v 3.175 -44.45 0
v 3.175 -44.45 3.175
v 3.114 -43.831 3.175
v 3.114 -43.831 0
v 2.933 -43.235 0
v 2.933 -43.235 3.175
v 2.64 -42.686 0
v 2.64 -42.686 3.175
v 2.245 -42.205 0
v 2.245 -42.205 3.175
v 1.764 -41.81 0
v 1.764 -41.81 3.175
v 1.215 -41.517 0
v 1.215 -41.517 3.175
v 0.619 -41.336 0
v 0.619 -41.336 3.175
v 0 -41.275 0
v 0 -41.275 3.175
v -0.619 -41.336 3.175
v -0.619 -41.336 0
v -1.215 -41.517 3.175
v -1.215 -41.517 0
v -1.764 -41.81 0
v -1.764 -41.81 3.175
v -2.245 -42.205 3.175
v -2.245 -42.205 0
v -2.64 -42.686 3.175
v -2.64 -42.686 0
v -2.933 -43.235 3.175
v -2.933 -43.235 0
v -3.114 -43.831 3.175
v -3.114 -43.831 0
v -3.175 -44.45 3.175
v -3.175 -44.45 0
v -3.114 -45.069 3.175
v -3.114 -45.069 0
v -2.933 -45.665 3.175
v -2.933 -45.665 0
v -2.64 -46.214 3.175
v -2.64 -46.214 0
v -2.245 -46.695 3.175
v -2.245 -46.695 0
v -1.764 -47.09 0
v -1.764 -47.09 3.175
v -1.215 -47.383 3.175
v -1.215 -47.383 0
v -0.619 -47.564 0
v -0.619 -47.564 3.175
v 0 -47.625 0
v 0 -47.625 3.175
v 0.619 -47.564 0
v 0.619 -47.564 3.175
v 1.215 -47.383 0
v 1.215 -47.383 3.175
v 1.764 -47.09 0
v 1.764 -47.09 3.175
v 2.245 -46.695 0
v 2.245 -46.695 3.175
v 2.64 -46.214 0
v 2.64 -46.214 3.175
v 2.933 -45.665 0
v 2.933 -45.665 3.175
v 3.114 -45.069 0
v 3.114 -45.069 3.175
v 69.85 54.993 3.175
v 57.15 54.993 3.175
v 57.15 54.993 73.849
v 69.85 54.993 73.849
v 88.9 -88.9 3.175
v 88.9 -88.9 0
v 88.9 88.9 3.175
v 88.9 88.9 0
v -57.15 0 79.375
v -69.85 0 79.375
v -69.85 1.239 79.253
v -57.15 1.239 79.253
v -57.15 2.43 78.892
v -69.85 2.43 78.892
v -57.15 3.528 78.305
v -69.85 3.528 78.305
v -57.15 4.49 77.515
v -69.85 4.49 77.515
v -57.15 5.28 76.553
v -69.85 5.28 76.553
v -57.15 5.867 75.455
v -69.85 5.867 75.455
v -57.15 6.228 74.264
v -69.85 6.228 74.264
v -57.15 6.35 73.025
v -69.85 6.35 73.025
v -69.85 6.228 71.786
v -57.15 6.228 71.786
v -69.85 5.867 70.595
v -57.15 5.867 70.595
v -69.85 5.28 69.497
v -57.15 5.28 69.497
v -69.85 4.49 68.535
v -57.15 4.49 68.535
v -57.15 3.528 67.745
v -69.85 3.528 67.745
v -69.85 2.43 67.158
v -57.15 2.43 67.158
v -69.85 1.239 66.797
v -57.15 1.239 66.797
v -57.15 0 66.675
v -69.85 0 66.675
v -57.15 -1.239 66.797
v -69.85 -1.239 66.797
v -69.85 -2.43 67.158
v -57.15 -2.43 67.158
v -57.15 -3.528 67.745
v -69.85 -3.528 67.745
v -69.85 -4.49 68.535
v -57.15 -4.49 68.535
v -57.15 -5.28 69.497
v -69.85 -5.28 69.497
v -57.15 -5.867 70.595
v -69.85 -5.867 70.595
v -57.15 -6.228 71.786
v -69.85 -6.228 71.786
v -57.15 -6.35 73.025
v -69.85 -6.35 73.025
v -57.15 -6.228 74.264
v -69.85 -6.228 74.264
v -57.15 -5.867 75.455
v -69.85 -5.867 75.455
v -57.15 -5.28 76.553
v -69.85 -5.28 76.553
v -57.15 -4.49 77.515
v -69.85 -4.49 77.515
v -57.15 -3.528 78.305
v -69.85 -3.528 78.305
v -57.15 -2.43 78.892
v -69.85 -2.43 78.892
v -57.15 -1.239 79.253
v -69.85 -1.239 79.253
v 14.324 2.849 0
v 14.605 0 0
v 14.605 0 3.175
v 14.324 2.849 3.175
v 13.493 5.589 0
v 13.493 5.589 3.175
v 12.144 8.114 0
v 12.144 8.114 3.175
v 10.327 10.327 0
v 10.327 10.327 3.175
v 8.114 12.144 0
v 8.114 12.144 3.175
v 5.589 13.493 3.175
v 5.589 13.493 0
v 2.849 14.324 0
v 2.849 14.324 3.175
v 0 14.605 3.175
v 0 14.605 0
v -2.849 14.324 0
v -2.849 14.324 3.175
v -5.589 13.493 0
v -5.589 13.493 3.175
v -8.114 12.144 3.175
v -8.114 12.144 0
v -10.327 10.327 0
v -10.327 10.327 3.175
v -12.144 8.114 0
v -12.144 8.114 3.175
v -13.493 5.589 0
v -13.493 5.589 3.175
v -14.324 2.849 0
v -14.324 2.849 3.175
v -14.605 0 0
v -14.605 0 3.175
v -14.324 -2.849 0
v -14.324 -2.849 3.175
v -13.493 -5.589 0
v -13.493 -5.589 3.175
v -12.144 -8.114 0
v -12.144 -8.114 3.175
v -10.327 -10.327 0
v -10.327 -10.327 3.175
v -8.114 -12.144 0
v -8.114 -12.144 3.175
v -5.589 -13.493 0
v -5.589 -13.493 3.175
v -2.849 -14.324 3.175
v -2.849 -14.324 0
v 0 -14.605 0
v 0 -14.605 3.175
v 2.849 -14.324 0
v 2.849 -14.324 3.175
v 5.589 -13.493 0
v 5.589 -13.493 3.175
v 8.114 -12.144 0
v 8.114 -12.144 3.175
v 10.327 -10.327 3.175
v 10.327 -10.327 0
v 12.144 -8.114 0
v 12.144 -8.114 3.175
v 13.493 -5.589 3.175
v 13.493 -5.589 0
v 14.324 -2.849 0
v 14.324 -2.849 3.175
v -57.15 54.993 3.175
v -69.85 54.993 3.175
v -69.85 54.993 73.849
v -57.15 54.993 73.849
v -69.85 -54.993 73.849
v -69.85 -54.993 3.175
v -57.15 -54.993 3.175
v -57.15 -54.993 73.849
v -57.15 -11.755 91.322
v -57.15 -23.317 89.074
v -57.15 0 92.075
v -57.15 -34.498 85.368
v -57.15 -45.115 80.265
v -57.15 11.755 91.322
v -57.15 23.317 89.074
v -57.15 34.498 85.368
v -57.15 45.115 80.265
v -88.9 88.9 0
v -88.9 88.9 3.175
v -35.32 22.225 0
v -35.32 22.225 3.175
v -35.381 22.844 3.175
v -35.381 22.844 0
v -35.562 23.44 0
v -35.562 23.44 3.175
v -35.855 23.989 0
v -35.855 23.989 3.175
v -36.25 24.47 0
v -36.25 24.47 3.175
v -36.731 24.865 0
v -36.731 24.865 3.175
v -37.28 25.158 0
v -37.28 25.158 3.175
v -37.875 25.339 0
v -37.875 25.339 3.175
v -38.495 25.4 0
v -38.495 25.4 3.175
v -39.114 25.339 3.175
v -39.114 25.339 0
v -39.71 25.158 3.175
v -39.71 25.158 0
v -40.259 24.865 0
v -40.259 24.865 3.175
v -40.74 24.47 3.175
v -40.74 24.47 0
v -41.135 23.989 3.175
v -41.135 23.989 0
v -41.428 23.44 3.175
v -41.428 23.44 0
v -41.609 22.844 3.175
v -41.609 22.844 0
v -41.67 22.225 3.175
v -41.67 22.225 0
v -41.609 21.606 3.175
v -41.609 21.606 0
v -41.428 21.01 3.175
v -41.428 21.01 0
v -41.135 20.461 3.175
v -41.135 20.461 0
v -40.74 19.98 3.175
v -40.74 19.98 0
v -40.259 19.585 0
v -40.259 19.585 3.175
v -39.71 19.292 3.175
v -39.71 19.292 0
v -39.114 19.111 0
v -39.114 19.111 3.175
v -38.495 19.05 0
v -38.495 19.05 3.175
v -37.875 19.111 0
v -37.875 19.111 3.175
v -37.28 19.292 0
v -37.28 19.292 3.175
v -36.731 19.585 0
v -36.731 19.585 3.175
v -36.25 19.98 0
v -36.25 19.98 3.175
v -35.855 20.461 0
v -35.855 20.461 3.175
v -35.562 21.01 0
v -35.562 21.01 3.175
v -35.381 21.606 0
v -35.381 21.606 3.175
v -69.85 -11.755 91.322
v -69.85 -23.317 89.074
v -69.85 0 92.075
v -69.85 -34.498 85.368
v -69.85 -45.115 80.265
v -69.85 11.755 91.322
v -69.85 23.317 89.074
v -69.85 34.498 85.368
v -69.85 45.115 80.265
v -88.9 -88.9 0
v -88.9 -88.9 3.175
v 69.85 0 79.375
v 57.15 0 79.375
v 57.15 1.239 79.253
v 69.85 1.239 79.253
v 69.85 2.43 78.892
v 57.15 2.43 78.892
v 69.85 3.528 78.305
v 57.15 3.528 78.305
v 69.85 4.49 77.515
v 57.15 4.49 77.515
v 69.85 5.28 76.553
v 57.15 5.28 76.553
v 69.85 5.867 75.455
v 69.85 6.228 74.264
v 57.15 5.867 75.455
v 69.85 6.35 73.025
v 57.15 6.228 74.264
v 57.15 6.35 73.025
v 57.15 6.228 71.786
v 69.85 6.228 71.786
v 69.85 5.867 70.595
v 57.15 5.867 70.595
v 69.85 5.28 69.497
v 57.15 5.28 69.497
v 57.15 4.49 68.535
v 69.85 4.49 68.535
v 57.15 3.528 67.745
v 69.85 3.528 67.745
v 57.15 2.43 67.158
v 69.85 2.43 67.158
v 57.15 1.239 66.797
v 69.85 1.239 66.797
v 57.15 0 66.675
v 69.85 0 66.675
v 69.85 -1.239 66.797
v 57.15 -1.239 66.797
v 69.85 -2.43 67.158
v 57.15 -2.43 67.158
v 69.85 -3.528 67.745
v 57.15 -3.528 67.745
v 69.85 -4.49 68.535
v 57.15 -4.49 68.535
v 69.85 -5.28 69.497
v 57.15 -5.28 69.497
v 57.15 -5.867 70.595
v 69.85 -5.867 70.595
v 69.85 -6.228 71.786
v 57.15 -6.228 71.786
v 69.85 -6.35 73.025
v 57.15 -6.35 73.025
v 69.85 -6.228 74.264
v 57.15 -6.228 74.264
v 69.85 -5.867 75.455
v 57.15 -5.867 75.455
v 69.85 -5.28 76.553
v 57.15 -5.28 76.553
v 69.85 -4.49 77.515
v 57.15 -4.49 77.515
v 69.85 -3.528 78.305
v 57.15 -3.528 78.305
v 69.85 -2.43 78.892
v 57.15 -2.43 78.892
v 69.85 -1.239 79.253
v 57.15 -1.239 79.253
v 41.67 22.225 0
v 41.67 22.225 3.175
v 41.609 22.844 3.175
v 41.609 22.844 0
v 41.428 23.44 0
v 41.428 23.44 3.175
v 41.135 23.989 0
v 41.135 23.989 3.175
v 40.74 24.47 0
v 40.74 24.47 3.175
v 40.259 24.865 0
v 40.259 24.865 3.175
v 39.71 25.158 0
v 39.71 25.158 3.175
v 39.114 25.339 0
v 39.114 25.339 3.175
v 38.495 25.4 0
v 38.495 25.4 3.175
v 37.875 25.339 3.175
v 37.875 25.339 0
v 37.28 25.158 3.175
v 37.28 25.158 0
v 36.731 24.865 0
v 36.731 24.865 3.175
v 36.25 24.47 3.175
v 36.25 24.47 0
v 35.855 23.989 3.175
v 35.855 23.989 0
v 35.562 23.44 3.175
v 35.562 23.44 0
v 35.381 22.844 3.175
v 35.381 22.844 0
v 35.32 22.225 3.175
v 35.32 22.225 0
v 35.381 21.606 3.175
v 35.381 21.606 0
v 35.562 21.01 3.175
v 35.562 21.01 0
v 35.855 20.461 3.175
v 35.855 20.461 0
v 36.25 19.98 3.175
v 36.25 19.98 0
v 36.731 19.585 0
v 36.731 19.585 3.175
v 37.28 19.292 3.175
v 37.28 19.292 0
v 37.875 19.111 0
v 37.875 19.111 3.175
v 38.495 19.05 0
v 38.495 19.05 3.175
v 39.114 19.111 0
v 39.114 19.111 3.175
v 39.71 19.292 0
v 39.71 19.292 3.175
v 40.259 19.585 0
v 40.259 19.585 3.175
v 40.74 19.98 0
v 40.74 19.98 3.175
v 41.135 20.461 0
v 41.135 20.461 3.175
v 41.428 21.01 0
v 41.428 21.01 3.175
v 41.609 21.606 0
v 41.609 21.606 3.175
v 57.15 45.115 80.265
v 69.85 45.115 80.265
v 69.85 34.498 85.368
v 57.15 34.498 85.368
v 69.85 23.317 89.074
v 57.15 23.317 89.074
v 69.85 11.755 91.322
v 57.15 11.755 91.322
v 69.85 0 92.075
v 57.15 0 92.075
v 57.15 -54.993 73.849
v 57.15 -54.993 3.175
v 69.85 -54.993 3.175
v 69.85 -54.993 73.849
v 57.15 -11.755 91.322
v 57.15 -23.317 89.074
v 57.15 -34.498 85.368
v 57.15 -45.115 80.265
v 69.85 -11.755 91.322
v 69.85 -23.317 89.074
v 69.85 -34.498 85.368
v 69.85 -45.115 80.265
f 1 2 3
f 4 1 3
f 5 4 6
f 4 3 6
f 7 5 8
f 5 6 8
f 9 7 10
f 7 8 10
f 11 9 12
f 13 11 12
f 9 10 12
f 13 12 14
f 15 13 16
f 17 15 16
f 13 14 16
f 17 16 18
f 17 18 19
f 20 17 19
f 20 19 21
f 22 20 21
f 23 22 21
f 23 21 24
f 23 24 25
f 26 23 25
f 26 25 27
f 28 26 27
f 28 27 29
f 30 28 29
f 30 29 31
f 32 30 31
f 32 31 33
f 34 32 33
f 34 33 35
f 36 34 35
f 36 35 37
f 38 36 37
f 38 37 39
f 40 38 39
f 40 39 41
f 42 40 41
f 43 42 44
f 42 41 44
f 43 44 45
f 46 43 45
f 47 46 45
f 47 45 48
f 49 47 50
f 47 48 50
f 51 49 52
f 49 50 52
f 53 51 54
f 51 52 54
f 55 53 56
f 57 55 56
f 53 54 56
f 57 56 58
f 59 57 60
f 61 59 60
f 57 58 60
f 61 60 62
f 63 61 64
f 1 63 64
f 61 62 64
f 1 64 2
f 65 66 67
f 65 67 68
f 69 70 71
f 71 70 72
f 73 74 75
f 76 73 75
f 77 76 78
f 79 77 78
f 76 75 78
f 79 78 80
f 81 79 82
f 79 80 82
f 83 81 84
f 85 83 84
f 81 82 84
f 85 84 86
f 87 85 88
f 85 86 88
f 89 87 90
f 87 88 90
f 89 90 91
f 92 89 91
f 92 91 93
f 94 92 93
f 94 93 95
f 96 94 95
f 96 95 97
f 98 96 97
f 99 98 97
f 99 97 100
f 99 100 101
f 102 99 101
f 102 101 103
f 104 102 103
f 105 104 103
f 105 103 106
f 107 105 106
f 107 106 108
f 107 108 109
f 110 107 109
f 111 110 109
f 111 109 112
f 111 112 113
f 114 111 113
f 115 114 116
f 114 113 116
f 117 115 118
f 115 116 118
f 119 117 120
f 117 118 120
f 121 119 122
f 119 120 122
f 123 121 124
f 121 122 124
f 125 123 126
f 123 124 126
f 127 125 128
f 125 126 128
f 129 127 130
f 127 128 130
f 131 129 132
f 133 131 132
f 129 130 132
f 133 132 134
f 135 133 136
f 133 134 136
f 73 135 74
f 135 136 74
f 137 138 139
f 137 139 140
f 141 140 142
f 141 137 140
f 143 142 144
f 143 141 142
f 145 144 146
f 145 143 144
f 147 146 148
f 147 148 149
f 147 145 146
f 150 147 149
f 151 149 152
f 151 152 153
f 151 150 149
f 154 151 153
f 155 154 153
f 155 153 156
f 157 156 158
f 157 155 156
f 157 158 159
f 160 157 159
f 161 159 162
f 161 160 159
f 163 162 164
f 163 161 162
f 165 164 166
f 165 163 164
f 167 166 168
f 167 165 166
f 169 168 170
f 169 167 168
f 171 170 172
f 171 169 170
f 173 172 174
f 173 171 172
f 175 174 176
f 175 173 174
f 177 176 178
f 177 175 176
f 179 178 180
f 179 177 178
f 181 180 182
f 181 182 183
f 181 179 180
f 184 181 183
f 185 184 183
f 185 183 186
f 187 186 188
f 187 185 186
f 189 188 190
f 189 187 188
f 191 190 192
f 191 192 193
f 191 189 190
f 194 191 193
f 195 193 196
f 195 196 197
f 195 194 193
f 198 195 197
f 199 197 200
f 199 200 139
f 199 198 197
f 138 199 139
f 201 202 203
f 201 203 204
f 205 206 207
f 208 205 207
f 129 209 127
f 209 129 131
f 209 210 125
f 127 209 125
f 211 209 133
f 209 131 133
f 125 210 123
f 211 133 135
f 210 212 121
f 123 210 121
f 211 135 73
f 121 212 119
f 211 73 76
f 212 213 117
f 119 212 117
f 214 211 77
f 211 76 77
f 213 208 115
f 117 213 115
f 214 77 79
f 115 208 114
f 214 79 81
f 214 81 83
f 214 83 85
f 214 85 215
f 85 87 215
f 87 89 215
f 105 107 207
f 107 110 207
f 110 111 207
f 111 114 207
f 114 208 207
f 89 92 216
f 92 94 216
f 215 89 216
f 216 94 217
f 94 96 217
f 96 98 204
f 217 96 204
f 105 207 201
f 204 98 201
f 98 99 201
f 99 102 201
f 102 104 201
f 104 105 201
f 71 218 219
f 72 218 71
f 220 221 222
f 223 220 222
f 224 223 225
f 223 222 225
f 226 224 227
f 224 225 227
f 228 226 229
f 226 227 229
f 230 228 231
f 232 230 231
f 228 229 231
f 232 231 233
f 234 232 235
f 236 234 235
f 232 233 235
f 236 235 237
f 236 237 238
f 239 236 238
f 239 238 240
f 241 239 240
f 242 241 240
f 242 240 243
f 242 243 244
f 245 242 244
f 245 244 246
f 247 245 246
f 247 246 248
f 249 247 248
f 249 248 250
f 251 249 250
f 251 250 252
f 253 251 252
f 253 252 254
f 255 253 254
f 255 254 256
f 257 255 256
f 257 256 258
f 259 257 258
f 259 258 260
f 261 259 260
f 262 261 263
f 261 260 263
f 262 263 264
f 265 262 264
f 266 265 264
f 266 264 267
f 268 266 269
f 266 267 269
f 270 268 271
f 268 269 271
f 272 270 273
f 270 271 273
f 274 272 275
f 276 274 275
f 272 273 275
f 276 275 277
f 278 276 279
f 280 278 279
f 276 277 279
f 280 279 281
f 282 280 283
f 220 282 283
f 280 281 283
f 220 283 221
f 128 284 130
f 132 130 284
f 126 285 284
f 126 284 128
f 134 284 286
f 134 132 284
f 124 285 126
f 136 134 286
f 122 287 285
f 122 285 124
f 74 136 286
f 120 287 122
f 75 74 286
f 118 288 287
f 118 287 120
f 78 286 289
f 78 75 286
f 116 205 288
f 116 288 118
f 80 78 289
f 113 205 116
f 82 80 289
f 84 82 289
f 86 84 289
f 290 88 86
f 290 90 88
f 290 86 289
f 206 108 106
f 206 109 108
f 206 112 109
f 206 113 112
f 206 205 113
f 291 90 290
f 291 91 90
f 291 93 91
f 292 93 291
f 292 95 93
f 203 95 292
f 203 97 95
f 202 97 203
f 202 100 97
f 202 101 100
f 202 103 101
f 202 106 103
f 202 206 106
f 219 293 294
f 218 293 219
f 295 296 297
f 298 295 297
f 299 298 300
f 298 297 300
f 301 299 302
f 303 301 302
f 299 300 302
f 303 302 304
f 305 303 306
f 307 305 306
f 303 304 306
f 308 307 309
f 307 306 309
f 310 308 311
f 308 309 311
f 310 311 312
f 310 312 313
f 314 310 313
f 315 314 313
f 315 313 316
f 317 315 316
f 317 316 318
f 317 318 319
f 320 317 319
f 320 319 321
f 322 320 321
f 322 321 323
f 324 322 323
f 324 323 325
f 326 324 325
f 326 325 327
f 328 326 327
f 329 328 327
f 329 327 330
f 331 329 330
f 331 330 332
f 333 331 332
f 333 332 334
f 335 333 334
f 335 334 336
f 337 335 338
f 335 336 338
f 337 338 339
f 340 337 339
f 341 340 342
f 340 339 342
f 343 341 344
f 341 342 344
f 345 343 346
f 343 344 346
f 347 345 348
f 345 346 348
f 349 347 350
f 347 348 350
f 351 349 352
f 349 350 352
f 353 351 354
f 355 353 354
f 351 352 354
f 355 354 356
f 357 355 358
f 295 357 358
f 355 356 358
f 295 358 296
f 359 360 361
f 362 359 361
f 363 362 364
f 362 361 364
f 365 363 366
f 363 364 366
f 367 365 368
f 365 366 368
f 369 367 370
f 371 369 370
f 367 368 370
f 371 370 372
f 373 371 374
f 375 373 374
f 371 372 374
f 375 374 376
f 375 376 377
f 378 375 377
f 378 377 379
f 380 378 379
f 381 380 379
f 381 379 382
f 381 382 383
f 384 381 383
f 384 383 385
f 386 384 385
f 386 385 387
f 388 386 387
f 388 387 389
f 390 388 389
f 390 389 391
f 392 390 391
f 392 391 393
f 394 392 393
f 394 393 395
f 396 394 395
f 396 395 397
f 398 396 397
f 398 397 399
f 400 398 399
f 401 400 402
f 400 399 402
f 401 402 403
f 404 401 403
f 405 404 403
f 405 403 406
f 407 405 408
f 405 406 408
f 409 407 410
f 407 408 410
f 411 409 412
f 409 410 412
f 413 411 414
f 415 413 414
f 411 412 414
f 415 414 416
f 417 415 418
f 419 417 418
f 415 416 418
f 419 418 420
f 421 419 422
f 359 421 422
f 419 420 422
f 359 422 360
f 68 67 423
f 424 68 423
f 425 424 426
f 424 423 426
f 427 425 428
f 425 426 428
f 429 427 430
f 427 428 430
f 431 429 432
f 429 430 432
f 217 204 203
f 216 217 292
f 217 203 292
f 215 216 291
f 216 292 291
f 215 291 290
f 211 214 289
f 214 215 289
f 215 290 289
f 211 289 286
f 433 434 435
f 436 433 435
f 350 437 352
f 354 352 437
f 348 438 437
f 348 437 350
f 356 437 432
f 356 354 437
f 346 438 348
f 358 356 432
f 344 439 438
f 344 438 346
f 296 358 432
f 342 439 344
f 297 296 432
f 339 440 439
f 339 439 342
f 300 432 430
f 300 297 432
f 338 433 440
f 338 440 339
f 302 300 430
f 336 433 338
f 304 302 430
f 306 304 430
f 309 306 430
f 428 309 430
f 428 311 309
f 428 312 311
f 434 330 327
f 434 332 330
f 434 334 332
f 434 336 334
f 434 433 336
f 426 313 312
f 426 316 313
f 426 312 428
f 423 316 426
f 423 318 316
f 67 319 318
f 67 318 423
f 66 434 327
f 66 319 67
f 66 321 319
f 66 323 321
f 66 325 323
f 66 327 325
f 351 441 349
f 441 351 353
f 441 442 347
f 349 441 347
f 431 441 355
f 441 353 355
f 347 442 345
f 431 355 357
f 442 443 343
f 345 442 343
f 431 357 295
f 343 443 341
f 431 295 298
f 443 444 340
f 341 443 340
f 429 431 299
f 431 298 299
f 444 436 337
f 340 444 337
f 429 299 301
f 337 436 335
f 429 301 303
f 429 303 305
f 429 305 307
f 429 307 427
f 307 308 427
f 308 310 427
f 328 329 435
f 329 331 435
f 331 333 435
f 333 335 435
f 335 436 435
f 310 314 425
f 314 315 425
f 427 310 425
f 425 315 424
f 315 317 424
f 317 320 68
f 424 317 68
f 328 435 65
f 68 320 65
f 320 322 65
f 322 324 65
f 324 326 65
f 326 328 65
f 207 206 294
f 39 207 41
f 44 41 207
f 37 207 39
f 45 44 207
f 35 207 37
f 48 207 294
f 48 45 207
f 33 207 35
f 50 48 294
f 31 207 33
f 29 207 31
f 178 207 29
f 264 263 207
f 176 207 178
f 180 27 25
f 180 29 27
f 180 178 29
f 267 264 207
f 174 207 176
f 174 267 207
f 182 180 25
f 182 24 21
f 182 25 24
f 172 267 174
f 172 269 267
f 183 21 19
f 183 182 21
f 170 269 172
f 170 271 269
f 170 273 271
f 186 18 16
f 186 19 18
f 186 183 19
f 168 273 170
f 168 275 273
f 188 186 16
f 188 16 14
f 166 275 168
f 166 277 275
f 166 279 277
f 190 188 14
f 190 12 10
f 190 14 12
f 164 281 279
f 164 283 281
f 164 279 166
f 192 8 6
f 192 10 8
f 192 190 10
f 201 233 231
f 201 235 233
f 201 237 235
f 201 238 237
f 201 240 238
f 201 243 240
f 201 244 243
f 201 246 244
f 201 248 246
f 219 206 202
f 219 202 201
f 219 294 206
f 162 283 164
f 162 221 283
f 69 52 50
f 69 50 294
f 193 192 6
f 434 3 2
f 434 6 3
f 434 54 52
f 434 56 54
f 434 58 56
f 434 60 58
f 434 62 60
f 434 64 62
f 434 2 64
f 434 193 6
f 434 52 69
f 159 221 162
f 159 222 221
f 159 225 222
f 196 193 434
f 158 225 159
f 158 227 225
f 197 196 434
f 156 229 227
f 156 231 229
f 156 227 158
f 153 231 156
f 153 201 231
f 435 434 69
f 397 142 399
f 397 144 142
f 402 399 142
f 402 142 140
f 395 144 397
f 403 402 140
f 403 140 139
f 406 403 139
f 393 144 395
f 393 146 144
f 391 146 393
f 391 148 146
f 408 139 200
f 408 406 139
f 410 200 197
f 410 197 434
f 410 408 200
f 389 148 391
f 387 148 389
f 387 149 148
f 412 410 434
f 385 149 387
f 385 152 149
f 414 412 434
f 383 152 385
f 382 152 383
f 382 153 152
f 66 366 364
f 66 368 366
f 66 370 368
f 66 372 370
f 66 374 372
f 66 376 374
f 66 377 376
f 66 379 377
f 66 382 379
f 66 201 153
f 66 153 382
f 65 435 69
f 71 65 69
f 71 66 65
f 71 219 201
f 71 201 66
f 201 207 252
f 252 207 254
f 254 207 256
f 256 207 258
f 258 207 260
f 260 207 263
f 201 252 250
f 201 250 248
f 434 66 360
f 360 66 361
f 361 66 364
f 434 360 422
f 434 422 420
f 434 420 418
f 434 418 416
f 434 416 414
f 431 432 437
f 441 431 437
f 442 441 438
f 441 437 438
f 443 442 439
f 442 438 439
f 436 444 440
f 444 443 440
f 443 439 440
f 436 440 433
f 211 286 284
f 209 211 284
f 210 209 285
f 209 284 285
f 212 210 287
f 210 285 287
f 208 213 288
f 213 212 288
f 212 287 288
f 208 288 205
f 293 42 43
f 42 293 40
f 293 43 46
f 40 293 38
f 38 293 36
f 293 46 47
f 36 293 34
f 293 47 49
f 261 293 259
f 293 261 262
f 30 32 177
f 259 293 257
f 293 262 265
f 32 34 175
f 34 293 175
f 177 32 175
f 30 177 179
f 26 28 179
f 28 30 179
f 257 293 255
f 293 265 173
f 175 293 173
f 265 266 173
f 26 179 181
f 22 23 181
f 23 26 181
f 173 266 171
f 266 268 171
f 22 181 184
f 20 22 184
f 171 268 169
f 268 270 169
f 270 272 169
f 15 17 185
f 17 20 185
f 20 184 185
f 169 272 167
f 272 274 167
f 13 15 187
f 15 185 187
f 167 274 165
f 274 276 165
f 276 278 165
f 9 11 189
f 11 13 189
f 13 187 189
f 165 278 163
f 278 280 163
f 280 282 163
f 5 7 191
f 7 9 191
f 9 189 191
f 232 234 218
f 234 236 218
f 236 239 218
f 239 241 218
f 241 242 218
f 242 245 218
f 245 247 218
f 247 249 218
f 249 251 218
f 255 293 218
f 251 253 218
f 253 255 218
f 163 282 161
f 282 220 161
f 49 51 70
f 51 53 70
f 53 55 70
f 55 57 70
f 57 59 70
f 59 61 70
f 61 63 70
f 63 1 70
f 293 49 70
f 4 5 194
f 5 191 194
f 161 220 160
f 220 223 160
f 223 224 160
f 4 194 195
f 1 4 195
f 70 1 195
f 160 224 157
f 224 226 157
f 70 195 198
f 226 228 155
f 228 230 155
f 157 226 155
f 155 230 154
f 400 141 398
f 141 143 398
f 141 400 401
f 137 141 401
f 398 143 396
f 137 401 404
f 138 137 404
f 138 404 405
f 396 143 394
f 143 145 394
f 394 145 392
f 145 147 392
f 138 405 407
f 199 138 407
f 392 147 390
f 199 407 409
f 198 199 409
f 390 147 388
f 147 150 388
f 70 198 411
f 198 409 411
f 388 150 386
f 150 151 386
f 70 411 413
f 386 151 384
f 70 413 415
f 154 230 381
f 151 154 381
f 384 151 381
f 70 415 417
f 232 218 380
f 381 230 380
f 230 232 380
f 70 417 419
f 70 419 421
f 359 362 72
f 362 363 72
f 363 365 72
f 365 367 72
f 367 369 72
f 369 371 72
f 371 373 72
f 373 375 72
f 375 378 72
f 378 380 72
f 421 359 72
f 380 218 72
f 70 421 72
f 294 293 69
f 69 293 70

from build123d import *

# Parameters (mm, degrees)
SKETCH1_W           = 177.8
SKETCH1_H           = 177.8
SKETCH1_R           = 14.605
BOSS_EXTRUDE1_DEPTH = 3.175
SKETCH2_R           = 3.175
CUT_EXTRUDE1_DEPTH  = 126.763669734
SKETCH2_3_W         = 12.7
SKETCH2_3_H         = 109.98522628
BOSS_EXTRUDE2_DEPTH = 88.9
SKETCH3_R           = 6.35
CUT_EXTRUDE2_DEPTH  = 204.918067186


with BuildPart() as part:
    # Sketch1 → Boss-Extrude1 (new body)
    with BuildSketch(Plane.XY):
        Rectangle(SKETCH1_W, SKETCH1_H)
        Circle(SKETCH1_R, mode=Mode.SUBTRACT)
    extrude(amount=BOSS_EXTRUDE1_DEPTH)

    # Sketch2 → Cut-Extrude1 (cut, through all)
    with BuildSketch(Plane.XY.offset(3.175)):
        with Locations((-38.494829198, 22.225)):
            Circle(SKETCH2_R)
        with Locations((0, -44.45)):
            Circle(SKETCH2_R)
        with Locations((38.494829198, 22.225)):
            Circle(SKETCH2_R)
    extrude(amount=-CUT_EXTRUDE1_DEPTH, mode=Mode.SUBTRACT)

    # Sketch2<3> → Boss-Extrude2 (add)
    with BuildSketch(Plane.XY.offset(3.175)):
        with Locations((-63.5, 0)):
            Rectangle(SKETCH2_3_W, SKETCH2_3_H)
        with Locations((63.5, 0)):
            Rectangle(SKETCH2_3_W, SKETCH2_3_H)
    extrude(amount=BOSS_EXTRUDE2_DEPTH)

    # Sketch3 → Cut-Extrude2 (cut, through all)
    with BuildSketch(Plane.ZY.offset(69.85)):
        with Locations((73.025, 0)):
            Circle(SKETCH3_R)
        with BuildLine():
            ThreePointArc((73.84861627, 54.99261314), (87.399705286, 28.967173507), (92.075, 0))
            Line((92.075, 0), (92.075, 54.99261314))
            Line((92.075, 54.99261314), (73.84861627, 54.99261314))
        make_face()
        with BuildLine():
            Line((92.075, -54.99261314), (92.075, 0))
            ThreePointArc((92.075, 0), (87.399705286, -28.967173507), (73.84861627, -54.99261314))
            Line((73.84861627, -54.99261314), (92.075, -54.99261314))
        make_face()
    extrude(amount=-CUT_EXTRUDE2_DEPTH, mode=Mode.SUBTRACT)


solid = part.part
